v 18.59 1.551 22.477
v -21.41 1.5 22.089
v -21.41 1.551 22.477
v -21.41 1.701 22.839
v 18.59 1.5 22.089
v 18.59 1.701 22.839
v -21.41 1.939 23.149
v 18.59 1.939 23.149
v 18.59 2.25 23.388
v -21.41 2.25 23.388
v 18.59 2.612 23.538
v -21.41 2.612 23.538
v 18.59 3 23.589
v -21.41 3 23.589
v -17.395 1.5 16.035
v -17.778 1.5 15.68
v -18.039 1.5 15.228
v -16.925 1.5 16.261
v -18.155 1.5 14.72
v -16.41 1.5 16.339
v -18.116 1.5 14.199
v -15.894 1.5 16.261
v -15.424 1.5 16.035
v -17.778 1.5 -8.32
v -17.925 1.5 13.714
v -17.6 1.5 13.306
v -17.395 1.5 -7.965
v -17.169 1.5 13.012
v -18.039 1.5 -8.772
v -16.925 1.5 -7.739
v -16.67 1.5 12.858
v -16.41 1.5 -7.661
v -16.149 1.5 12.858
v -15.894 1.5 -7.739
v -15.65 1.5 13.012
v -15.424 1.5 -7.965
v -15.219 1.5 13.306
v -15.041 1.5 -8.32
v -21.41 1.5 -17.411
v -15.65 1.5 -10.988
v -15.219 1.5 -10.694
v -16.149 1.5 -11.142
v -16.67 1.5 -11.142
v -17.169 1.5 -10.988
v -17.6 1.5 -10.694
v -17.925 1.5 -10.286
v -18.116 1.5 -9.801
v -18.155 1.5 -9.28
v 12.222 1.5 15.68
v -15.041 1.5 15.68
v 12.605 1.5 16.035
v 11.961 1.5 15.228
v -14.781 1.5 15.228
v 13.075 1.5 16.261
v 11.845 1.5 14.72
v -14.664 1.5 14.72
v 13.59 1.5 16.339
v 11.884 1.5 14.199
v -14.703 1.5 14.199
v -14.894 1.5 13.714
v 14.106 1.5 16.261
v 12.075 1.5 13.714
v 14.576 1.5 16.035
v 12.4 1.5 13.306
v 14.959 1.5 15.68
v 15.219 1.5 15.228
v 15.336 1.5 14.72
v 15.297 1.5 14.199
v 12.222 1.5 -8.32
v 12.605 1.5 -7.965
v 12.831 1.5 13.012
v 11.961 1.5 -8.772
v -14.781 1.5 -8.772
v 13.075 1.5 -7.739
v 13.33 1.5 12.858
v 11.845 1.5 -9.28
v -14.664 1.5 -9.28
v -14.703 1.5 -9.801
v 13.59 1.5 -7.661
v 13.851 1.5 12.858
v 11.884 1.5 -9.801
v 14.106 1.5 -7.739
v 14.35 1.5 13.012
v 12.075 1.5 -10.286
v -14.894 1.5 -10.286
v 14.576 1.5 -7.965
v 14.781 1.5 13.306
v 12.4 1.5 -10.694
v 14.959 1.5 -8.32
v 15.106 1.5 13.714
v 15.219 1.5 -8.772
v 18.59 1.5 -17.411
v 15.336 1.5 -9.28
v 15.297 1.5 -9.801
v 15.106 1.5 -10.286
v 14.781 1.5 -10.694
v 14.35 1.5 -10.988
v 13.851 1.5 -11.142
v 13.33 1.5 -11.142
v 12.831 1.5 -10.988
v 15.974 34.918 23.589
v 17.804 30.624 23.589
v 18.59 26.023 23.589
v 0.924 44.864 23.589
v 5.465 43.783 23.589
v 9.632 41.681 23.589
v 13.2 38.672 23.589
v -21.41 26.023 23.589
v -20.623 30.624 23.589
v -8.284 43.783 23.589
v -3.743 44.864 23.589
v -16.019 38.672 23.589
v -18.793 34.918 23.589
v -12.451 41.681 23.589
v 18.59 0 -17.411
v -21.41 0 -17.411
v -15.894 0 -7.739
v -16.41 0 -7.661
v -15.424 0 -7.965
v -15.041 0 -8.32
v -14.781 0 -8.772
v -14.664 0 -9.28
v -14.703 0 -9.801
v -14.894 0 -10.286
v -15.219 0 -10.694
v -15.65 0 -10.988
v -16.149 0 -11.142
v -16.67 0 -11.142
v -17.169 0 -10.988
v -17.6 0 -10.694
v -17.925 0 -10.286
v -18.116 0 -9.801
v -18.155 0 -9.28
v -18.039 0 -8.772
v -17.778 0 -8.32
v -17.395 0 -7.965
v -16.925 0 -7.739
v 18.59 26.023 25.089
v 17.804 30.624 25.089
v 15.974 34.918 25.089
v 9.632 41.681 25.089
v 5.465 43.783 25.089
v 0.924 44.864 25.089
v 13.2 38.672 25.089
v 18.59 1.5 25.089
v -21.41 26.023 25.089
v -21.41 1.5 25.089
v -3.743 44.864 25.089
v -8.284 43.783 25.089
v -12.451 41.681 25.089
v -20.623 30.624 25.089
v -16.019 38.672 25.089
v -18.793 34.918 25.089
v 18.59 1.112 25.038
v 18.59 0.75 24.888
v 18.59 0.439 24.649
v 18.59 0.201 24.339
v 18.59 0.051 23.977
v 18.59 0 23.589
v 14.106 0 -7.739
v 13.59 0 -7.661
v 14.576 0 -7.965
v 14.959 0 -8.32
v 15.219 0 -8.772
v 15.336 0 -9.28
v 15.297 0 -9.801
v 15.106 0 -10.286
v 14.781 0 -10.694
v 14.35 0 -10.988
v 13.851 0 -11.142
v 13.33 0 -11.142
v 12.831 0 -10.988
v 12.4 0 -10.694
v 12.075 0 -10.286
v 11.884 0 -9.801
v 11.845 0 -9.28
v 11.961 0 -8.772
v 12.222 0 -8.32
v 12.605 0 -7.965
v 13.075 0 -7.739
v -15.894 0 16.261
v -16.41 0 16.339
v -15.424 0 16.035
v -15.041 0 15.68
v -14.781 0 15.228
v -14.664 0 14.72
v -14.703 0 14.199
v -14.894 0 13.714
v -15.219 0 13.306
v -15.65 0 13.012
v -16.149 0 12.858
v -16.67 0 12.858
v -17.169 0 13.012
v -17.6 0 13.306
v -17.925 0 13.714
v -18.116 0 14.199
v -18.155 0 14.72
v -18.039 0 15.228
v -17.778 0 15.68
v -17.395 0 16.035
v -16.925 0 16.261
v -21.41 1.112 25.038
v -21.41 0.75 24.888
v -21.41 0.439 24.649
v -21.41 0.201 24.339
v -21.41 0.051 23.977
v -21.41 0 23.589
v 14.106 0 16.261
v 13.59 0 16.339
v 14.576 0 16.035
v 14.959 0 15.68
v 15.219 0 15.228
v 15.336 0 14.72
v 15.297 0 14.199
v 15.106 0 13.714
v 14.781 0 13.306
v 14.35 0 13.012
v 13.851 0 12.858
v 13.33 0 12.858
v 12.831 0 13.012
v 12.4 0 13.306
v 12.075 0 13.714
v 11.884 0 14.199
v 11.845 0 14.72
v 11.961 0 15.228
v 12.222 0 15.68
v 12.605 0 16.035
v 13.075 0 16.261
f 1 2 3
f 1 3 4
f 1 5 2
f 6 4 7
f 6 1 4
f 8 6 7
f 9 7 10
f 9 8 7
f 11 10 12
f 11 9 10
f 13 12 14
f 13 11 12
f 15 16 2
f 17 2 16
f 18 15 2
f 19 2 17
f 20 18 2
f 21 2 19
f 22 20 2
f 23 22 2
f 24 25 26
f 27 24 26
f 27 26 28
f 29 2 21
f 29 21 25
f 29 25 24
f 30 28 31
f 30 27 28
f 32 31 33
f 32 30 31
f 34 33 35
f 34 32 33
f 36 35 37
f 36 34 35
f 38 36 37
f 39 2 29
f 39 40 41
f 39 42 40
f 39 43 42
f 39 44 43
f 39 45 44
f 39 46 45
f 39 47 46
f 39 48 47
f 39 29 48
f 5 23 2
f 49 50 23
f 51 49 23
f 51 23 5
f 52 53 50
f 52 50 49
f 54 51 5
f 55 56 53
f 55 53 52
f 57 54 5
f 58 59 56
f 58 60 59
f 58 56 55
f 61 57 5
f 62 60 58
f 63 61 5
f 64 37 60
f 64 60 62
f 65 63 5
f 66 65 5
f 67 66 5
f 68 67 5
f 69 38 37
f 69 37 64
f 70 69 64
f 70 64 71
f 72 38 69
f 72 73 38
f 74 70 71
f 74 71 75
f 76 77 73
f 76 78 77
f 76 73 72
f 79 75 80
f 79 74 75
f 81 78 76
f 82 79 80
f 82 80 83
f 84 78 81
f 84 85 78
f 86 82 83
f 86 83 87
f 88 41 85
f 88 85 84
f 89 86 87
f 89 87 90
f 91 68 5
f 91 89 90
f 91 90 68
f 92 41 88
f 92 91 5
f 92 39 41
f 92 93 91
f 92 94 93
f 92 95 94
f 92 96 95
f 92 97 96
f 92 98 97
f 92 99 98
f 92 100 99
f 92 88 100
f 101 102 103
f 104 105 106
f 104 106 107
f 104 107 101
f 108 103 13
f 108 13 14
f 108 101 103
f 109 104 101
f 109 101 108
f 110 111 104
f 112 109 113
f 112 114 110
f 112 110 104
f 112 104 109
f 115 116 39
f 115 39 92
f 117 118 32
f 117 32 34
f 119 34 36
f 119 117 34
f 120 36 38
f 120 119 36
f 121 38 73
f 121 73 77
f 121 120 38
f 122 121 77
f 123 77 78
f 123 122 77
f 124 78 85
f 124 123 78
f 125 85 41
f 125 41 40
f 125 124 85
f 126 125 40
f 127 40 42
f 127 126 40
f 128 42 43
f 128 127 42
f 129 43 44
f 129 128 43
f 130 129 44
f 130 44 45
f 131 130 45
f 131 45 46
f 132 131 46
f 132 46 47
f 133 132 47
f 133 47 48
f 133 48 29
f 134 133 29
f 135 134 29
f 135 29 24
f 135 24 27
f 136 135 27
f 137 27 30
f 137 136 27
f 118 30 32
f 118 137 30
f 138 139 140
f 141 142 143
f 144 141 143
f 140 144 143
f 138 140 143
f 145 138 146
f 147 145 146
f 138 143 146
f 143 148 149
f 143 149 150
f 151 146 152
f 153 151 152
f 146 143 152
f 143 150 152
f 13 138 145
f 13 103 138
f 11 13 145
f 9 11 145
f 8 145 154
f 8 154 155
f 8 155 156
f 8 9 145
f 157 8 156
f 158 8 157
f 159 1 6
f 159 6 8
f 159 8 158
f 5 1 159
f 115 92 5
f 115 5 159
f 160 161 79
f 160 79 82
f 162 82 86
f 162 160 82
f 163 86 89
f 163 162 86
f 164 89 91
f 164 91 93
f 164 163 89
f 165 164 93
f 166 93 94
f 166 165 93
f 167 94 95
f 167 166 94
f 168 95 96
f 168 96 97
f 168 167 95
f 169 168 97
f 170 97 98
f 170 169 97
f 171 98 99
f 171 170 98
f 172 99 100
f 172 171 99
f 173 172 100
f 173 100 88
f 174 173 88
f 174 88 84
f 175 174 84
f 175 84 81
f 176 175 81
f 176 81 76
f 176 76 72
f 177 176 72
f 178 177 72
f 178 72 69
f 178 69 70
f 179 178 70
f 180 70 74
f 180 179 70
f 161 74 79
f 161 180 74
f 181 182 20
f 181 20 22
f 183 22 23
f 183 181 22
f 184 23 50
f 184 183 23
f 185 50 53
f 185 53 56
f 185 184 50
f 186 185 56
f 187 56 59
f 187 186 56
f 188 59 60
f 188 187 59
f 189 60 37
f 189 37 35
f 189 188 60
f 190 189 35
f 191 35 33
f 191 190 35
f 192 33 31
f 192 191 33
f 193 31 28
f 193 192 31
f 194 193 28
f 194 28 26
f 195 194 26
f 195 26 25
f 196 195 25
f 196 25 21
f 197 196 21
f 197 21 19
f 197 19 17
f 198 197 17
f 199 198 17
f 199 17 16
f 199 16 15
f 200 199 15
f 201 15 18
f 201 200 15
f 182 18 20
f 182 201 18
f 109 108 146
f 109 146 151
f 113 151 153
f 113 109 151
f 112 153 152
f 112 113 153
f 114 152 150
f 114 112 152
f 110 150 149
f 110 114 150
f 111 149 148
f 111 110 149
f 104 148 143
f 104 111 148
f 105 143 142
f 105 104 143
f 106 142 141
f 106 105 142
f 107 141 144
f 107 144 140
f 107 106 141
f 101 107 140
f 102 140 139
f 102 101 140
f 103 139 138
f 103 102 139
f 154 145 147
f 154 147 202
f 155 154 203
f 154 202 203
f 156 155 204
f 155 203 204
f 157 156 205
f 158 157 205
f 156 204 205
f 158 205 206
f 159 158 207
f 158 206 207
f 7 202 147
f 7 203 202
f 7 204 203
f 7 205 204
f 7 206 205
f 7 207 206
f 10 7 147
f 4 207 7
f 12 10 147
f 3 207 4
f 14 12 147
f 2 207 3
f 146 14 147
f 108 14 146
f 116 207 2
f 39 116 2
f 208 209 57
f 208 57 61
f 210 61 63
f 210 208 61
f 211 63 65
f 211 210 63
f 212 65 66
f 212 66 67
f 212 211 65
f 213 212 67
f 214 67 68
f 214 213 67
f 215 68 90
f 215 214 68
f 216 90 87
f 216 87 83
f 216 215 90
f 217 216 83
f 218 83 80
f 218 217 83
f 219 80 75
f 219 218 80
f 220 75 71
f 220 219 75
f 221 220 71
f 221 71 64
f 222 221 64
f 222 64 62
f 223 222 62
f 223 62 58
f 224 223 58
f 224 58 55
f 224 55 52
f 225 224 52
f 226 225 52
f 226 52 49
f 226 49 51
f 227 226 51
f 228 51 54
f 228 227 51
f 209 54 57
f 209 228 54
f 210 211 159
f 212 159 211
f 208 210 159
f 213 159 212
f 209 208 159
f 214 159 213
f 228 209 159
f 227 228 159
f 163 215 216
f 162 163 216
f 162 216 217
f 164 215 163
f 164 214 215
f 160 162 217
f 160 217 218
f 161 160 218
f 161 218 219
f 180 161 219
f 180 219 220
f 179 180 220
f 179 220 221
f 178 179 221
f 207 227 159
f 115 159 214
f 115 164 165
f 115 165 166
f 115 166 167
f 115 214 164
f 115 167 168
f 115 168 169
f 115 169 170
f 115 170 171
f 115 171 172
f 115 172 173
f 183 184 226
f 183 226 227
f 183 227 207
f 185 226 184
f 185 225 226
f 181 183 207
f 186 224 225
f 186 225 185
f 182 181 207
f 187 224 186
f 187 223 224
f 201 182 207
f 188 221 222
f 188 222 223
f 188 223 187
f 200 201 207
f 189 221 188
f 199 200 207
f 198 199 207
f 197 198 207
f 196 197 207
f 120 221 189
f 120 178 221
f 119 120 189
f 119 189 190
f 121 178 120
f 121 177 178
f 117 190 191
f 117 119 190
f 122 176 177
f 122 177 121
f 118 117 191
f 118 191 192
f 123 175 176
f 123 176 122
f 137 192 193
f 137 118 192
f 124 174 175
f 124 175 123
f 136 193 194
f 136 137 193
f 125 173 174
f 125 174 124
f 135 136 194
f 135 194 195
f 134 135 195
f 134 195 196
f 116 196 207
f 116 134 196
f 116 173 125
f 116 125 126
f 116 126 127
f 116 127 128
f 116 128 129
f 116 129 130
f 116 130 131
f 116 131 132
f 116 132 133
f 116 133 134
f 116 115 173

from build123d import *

# Parameters (mm, degrees)
SKETCH_1_W      = 40
SKETCH_1_H      = 41
SKETCH_1_R      = 1.75
EXTRUDE_1_DEPTH = 1.5
EXTRUDE_2_DEPTH = 1.5
FILLET_1_R      = 1.5


with BuildPart() as part:
    # 草图1 → 凸台-拉伸1 (new body)
    with BuildSketch(Plane(origin=(0, 0, 0), x_dir=(1, 0, 0), z_dir=(0, 1, 0))):
        with Locations((-1.409556314, -3.088737201)):
            Rectangle(SKETCH_1_W, SKETCH_1_H)
        with Locations(Location((-16.409556314, 9.411262799, 0), (0, 0, 270))):
            Circle(SKETCH_1_R, mode=Mode.SUBTRACT)
        with Locations(Location((-16.409556314, -14.588737201, 0), (0, 0, 270))):
            Circle(SKETCH_1_R, mode=Mode.SUBTRACT)
        with Locations(Location((13.590443686, 9.411262799, 0), (0, 0, 270))):
            Circle(SKETCH_1_R, mode=Mode.SUBTRACT)
        with Locations(Location((13.590443686, -14.588737201, 0), (0, 0, 270))):
            Circle(SKETCH_1_R, mode=Mode.SUBTRACT)
    extrude(amount=EXTRUDE_1_DEPTH)

    # 草图2 → 凸台-拉伸2 (add)
    with BuildSketch(Plane.XY.offset(23.588737201)):
        with BuildLine():
            Line((-21.409556314, 1.5), (-21.409556314, 26.02333316))
            ThreePointArc((-21.409556314, 26.02333316), (-1.409556314, 45), (18.590443686, 26.02333316))
            Line((18.590443686, 26.02333316), (18.590443686, 1.5))
            Line((18.590443686, 1.5), (18.590443686, 0))
            Line((18.590443686, 0), (-21.409556314, 0))
            Line((-21.409556314, 0), (-21.409556314, 1.5))
        make_face()
    extrude(amount=EXTRUDE_2_DEPTH)

    # 圆角1
    fillet_1_edges = [part.edges().sort_by_distance(p)[0] for p in [
        (-1.409556314, 0, 25.088737201),
        (-1.409556314, 1.5, 23.588737201),
    ]]
    fillet(fillet_1_edges, radius=FILLET_1_R)


solid = part.part
